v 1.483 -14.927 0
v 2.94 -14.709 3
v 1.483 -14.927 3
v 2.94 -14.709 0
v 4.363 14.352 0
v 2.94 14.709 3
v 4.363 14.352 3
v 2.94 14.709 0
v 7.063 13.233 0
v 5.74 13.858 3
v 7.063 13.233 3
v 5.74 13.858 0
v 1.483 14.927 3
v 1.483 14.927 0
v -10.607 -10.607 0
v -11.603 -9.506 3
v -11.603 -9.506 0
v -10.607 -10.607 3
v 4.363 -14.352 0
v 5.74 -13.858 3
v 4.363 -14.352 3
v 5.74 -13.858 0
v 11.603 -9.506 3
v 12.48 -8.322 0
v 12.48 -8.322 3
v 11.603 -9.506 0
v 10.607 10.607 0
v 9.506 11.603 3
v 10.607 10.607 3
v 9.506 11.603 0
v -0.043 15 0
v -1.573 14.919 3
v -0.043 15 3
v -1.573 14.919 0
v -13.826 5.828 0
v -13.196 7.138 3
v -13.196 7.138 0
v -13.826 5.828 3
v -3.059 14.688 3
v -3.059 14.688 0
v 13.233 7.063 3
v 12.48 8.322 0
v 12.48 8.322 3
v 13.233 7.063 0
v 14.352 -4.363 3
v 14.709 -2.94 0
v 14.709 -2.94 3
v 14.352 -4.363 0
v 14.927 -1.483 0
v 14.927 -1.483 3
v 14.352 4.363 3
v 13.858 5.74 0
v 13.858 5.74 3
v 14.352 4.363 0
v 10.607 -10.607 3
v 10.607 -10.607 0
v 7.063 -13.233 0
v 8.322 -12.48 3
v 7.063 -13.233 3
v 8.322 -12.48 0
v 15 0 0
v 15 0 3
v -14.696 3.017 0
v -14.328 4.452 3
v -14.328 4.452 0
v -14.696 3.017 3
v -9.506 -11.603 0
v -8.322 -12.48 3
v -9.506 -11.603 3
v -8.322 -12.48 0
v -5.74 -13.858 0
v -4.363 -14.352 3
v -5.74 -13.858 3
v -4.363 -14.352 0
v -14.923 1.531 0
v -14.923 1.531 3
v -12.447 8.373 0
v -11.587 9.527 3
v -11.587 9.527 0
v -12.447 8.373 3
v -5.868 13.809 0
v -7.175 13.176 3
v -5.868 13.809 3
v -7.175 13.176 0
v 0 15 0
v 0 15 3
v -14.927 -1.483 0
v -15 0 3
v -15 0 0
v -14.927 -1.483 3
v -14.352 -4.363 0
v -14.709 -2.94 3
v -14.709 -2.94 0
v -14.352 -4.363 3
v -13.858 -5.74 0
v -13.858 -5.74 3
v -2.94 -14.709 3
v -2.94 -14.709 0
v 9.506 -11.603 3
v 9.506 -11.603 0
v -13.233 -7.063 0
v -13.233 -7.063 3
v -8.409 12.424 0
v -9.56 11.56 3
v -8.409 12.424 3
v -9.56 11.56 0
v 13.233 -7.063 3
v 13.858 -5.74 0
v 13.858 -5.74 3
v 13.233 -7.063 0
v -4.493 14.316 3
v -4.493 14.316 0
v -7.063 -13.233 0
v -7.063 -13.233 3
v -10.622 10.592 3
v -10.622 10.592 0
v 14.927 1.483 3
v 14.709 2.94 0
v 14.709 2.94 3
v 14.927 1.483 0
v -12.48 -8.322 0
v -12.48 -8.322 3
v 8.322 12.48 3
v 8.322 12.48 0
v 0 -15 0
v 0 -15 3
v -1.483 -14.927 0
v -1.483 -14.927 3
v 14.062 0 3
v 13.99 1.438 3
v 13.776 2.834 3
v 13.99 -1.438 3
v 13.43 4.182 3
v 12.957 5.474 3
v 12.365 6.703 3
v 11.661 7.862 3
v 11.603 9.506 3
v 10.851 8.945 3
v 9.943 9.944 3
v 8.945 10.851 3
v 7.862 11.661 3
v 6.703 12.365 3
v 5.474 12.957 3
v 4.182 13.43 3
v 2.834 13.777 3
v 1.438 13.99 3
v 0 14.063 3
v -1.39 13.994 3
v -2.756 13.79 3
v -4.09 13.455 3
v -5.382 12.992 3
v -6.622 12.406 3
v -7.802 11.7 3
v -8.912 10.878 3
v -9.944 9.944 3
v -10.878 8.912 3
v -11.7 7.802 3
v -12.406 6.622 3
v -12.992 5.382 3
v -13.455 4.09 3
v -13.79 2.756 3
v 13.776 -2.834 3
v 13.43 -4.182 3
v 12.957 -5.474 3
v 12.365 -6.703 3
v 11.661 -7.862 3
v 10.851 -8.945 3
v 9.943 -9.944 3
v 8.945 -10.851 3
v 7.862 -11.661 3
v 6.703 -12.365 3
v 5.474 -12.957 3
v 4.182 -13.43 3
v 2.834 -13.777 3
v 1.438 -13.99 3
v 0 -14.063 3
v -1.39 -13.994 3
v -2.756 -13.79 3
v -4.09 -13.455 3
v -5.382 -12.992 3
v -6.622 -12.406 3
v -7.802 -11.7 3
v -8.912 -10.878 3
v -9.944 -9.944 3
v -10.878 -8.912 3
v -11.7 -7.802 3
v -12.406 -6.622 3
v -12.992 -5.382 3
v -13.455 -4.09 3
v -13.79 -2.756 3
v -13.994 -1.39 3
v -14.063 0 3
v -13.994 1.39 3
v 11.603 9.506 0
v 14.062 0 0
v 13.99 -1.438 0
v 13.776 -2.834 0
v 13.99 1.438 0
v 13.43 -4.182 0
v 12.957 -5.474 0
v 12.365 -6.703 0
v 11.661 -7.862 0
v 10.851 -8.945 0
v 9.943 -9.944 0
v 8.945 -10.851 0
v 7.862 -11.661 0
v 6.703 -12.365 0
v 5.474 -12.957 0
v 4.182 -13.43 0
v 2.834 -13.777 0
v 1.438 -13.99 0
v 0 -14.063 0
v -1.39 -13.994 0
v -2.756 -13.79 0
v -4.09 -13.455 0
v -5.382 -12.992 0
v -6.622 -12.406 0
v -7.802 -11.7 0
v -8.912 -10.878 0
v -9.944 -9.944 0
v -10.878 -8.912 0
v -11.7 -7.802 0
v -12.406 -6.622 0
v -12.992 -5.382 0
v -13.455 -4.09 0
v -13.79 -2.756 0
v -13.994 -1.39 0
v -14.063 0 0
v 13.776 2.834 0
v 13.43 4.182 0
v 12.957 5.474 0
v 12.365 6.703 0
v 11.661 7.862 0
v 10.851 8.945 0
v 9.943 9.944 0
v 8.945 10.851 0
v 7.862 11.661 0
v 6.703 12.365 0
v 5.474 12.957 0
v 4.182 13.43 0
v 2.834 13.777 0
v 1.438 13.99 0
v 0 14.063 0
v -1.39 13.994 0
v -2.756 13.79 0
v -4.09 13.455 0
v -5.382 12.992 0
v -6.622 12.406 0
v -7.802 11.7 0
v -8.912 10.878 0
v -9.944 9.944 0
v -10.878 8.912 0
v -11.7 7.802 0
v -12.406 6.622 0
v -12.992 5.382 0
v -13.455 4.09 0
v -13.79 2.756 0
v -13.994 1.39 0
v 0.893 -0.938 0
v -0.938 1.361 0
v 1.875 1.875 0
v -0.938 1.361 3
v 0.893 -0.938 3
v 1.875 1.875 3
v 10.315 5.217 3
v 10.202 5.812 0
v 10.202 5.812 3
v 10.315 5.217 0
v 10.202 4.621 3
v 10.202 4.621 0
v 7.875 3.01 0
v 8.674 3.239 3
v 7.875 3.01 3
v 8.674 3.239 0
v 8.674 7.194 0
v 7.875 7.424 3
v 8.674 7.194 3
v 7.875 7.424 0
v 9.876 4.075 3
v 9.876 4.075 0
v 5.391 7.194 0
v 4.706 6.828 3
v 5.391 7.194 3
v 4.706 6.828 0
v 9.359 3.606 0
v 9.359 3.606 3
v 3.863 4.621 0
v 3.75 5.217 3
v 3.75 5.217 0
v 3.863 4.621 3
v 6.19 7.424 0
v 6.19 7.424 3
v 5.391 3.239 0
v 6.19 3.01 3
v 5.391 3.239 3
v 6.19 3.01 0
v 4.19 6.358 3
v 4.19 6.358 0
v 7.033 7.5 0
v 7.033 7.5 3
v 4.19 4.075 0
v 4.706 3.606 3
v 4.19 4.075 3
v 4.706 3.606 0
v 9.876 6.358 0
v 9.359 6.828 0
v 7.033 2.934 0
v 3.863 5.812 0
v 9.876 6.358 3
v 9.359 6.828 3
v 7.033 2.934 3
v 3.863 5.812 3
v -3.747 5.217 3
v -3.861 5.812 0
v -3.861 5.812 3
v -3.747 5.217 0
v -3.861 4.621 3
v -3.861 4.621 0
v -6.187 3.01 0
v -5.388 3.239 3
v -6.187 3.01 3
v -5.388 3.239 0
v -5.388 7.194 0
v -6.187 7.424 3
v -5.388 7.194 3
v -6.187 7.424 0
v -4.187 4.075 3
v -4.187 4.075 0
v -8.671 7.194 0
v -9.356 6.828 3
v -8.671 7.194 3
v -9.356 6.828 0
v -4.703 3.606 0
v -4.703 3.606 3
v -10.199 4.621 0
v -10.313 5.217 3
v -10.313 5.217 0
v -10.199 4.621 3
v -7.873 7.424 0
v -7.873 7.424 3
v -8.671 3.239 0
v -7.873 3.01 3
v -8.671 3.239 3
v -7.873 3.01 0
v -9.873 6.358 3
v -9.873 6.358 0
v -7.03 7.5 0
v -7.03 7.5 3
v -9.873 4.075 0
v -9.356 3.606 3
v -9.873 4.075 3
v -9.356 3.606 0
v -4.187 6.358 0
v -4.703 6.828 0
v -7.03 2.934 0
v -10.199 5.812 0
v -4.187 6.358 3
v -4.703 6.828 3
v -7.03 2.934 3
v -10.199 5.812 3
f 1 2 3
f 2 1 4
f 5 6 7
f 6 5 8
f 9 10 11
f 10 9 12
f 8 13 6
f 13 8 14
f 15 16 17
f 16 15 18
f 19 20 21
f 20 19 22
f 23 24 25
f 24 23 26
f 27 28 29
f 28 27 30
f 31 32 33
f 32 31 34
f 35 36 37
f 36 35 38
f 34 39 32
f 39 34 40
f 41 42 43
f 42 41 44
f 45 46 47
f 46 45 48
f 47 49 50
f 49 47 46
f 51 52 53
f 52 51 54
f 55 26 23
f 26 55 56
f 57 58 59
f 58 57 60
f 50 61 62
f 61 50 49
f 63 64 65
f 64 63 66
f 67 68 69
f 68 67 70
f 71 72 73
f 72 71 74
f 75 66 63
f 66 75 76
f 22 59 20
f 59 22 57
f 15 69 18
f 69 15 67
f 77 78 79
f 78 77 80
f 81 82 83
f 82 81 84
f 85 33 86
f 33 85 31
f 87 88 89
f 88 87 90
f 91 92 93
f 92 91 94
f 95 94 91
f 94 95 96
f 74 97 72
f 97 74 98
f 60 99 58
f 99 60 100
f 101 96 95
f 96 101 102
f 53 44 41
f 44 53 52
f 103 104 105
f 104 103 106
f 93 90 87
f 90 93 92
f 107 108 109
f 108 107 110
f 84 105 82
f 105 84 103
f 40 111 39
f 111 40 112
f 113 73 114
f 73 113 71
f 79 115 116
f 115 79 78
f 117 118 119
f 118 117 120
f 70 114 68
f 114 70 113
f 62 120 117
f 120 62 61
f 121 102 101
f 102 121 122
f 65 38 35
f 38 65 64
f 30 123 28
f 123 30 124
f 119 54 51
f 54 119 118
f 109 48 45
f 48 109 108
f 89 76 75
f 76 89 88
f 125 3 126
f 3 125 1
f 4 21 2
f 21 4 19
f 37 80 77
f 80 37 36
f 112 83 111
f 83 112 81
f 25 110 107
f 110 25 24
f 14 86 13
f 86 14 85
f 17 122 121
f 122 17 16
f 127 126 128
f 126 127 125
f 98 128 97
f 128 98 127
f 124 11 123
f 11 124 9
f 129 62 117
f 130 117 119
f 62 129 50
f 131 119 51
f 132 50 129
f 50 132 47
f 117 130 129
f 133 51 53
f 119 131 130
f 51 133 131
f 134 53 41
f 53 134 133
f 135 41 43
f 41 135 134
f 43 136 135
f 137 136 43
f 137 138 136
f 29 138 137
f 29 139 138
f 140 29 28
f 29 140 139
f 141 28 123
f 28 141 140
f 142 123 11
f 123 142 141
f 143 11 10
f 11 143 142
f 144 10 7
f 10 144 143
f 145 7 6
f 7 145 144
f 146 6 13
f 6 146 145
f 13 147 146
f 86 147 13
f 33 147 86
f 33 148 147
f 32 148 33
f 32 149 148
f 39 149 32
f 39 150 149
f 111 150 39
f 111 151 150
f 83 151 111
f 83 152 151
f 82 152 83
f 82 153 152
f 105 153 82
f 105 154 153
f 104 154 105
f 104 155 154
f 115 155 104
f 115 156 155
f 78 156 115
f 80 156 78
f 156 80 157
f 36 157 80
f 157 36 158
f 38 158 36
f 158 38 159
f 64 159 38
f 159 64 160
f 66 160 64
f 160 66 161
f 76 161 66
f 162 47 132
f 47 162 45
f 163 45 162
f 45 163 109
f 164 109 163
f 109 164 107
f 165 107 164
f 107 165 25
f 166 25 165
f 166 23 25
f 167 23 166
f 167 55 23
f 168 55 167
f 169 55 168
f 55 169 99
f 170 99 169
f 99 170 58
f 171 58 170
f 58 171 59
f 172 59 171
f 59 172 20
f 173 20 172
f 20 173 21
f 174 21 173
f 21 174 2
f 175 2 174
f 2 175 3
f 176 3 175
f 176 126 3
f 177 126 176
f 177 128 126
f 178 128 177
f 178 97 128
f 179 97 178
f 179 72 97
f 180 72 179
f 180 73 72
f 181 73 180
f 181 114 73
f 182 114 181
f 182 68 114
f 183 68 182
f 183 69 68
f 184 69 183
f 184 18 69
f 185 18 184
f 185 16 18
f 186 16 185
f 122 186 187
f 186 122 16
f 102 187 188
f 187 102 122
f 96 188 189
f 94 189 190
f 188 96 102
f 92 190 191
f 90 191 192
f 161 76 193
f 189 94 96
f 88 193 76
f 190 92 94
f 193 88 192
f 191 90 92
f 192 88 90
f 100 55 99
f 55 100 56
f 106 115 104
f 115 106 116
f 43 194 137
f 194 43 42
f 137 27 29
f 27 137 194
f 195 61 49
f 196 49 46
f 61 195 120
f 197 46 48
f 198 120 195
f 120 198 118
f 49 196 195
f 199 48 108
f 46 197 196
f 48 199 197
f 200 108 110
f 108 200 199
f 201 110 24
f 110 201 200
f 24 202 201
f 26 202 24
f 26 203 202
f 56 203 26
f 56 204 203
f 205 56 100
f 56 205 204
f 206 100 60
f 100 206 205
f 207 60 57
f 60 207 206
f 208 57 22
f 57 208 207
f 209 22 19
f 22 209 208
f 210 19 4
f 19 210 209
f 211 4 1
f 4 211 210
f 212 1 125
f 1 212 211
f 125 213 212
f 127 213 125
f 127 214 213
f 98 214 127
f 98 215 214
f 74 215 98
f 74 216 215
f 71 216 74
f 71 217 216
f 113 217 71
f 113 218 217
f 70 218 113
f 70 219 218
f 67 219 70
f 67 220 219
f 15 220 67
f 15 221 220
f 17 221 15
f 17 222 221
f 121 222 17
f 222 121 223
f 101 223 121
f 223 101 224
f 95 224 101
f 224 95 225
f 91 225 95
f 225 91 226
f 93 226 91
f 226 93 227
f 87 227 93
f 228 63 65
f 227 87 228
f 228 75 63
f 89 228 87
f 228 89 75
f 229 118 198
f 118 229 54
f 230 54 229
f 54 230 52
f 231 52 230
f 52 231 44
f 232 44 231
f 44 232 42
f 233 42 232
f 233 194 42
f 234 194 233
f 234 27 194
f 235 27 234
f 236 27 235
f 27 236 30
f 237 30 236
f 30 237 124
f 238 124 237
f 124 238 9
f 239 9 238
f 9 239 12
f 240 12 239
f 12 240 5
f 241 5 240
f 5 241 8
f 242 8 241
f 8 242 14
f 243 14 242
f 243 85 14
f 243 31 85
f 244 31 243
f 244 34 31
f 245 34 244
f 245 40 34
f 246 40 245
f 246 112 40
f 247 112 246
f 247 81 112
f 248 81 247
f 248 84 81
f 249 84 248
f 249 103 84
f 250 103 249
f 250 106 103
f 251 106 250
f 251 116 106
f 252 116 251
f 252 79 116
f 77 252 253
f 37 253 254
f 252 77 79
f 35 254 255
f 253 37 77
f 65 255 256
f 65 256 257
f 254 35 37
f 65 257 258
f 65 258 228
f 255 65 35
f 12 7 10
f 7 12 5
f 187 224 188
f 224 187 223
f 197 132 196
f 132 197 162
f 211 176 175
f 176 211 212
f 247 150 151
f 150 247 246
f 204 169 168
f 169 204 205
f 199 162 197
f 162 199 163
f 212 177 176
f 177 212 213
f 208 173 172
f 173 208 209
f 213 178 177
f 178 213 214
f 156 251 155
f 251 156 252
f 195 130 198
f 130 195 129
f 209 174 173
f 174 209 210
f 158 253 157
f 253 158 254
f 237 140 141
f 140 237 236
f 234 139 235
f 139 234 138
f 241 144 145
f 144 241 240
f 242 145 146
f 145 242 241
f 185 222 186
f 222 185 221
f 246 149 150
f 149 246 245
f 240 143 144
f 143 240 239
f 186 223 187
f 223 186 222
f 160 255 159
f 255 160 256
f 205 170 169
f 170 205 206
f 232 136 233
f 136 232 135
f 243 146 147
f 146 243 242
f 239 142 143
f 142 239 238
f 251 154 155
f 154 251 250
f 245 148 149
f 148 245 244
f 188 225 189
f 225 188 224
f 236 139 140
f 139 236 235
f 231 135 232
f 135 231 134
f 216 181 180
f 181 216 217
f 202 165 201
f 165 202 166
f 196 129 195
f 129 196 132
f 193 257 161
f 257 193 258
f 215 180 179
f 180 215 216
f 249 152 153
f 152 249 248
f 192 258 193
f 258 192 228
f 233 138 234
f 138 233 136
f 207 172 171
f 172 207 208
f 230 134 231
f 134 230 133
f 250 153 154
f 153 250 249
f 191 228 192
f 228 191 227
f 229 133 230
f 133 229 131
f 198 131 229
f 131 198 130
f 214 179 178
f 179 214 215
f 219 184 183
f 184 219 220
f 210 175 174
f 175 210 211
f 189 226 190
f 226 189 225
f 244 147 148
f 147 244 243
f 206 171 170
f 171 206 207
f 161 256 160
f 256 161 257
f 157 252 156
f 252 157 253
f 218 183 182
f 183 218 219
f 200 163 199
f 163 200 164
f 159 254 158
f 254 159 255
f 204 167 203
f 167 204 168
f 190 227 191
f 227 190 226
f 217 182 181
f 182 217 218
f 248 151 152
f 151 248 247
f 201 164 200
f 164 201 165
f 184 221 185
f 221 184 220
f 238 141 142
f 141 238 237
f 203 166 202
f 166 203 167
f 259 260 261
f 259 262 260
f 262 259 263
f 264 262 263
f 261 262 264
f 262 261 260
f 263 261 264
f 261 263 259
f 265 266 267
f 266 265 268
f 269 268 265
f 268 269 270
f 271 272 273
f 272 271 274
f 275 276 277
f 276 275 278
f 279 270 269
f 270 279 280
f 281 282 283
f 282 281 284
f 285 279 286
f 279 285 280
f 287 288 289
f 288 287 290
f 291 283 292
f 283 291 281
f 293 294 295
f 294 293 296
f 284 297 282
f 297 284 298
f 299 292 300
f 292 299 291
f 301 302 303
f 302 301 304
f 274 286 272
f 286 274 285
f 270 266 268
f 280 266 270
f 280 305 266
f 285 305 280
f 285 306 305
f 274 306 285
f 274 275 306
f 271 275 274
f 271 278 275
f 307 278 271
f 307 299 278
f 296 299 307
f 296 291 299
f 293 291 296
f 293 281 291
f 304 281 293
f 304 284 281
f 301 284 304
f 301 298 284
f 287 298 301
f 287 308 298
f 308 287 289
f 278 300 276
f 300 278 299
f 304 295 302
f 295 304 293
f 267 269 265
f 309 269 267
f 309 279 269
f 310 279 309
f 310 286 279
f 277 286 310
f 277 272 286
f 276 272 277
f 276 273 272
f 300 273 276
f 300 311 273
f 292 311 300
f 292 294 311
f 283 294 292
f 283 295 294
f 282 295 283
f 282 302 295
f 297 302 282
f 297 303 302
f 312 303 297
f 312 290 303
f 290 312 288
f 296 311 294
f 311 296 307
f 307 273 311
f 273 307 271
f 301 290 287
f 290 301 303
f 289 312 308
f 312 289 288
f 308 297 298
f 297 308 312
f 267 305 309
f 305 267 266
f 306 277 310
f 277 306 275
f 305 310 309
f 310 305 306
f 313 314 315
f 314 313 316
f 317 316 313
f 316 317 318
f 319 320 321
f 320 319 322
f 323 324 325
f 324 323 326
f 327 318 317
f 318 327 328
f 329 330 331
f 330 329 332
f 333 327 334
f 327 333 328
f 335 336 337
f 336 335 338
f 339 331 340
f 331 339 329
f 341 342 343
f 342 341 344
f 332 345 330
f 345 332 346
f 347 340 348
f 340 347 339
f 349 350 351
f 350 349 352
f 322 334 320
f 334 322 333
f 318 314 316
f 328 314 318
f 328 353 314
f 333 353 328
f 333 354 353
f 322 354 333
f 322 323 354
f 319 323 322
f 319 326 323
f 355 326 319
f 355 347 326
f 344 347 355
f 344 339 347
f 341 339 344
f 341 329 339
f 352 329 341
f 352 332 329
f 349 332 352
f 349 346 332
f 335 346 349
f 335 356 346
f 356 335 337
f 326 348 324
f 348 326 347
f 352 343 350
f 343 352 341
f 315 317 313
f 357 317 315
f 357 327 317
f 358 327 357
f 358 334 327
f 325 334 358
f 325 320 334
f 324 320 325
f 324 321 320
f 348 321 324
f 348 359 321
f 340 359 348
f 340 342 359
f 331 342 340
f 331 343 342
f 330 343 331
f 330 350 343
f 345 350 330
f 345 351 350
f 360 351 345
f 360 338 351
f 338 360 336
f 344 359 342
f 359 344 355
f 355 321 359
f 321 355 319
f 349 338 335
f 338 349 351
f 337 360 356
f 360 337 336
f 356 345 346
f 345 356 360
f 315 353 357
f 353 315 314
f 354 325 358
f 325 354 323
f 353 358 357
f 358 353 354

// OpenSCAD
// Module names are of the form poly_<inkscape-path-id>().  As a result,
// you can associate a polygon in this OpenSCAD program with the corresponding
// SVG element in the Inkscape document by looking for the XML element with
// the attribute id="inkscape-path-id".

// fudge value is used to ensure that subtracted solids are a tad taller
// in the z dimension than the polygon being subtracted from.  This helps
// keep the resulting .stl file manifold.
fudge = 0.1;

module poly_path890(h)
{
  scale([25.4/96, -25.4/96, 1]) union()
  {
    linear_extrude(height=h)
      polygon([[3.375257,3.543491],[-3.543926,-5.142996],[7.085988,-7.086432]]);
  }
}

module poly_path8433(h)
{
  scale([25.4/96, -25.4/96, 1]) union()
  {
    linear_extrude(height=h)
      polygon([[14.172670,-19.716904],[14.602158,-17.465311],[15.834948,-15.402146],[17.787526,-13.628016],[20.376377,-12.243525],[23.394717,-11.376423],[26.580084,-11.087389],[29.765451,-11.376423],[32.783791,-12.243525],[35.372642,-13.628016],[37.325219,-15.402146],[38.558009,-17.465311],[38.987498,-19.716904],[38.558009,-21.968497],[37.325219,-24.031662],[35.372642,-25.805792],[32.783791,-27.190283],[29.765451,-28.057385],[26.580084,-28.346419],[23.394717,-28.057385],[20.376377,-27.190283],[17.787526,-25.805792],[15.834948,-24.031662],[14.602158,-21.968497]]);
  }
}

module poly_path841(h)
{
  scale([25.4/96, -25.4/96, 1]) union()
  {
    difference()
    {
       linear_extrude(height=h)
         polygon([[-0.161134,-56.693112],[-5.945503,-56.385104],[-11.561801,-55.513267],[-16.981725,-54.105983],[-22.176973,-52.191636],[-27.119242,-49.798609],[-31.780231,-46.955285],[-36.131635,-43.690047],[-40.145154,-40.031278],[-43.792484,-36.007362],[-47.045323,-31.646681],[-49.875369,-26.977619],[-52.254319,-22.028558],[-54.153871,-16.827882],[-55.545722,-11.403974],[-56.401570,-5.785218],[-56.693112,0.000005],[-56.415712,5.603429],[-55.593737,11.111945],[-54.242586,16.488377],[-52.377658,21.695550],[-50.014351,26.696288],[-47.168063,31.453417],[-43.854193,35.929761],[-40.088140,40.088145],[-35.929756,43.854198],[-31.453412,47.168067],[-26.696282,50.014354],[-21.695543,52.377660],[-16.488370,54.242588],[-11.111938,55.593738],[-5.603422,56.415712],[0.000002,56.693112],[5.603426,56.415712],[11.111941,55.593737],[16.488373,54.242587],[21.695546,52.377659],[26.696284,50.014353],[31.453414,47.168065],[35.929758,43.854196],[40.088141,40.088144],[43.854194,35.929760],[47.168064,31.453416],[50.014351,26.696287],[52.377658,21.695549],[54.242586,16.488376],[55.593737,11.111944],[56.415712,5.603429],[56.693112,0.000005],[56.415713,-5.603420],[55.593739,-11.111936],[54.242589,-16.488368],[52.377661,-21.695542],[50.014354,-26.696281],[47.168067,-31.453411],[43.854198,-35.929756],[40.088145,-40.088140],[35.929761,-43.854194],[31.453417,-47.168063],[26.696287,-50.014351],[21.695548,-52.377658],[16.488375,-54.242586],[11.111942,-55.593737],[5.603426,-56.415712],[0.000002,-56.693112],[-0.161148,-56.693112],[-0.161134,-56.693112]]);
       translate([0, 0, -fudge])
         linear_extrude(height=h+2*fudge)
           polygon([[0.000016,-53.150021],[5.434176,-52.875476],[10.711350,-52.069949],[15.804824,-50.760154],[20.687883,-48.972807],[25.333814,-46.734623],[29.715900,-44.072319],[33.807429,-41.012608],[37.581686,-37.582207],[41.011955,-33.807831],[44.071523,-29.716196],[46.733675,-25.334016],[48.971696,-20.688008],[50.758873,-15.804886],[52.068490,-10.711367],[52.873834,-5.434164],[53.148189,0.000005],[52.873834,5.434175],[52.068490,10.711378],[50.758872,15.804898],[48.971694,20.688020],[46.733672,25.334029],[44.071519,29.716209],[41.011950,33.807844],[37.581679,37.582220],[33.807422,41.012621],[29.715892,44.072331],[25.333804,46.734635],[20.687873,48.972818],[15.804813,50.760164],[10.711338,52.069958],[5.434162,52.875485],[0.000002,53.150028],[-5.253239,52.889985],[-10.417504,52.119398],[-15.457941,50.852703],[-20.339696,49.104335],[-25.027919,46.888732],[-29.487756,44.220329],[-33.684355,41.113563],[-37.582862,37.582869],[-41.113556,33.684361],[-44.220322,29.487763],[-46.888725,25.027926],[-49.104329,20.339703],[-50.852696,15.457947],[-52.119391,10.417511],[-52.889979,5.253246],[-53.150021,0.000005],[-52.889979,-5.253236],[-52.119392,-10.417501],[-50.852697,-15.457938],[-49.104329,-20.339694],[-46.888726,-25.027917],[-44.220323,-29.487754],[-41.113557,-33.684353],[-37.582863,-37.582861],[-33.684355,-41.113555],[-29.487757,-44.220321],[-25.027920,-46.888724],[-20.339697,-49.104328],[-15.457941,-50.852696],[-10.417504,-52.119391],[-5.253239,-52.889978],[0.000002,-53.150021],[0.000016,-53.150021]]);
    }
  }
}

module poly_path862(h)
{
  scale([25.4/96, -25.4/96, 1]) union()
  {
    linear_extrude(height=h)
      polygon([[37.450074,11.624564],[37.605980,12.286457],[37.423808,13.006043],[36.883277,13.713445],[34.767665,15.072604],[31.340198,16.325737],[26.681929,17.434644],[21.000480,18.343884],[14.579915,19.012930],[0.304290,19.567149],[-12.445628,19.129477],[-23.381849,17.910866],[-27.894627,17.052859],[-31.623748,16.052600],[-34.459131,14.927748],[-36.290701,13.695964],[-35.970310,15.242349],[-35.302383,16.740672],[-32.994351,19.564595],[-29.507471,22.110655],[-24.982608,24.321778],[-19.560629,26.140888],[-13.382399,27.510909],[-6.588784,28.374766],[0.679349,28.675383],[8.135080,28.359113],[15.079395,27.452085],[21.363535,26.016890],[26.838744,24.116120],[31.356264,21.812365],[34.767337,19.168217],[36.011469,17.738054],[36.923205,16.246266],[37.483950,14.700674],[37.675110,13.109103],[37.505386,11.624564],[37.450074,11.624564]]);
  }
}

module poly_path843(h)
{
  scale([25.4/96, -25.4/96, 1]) union()
  {
    linear_extrude(height=h)
      polygon([[-38.976935,-19.716904],[-38.547447,-17.465311],[-37.314657,-15.402146],[-35.362080,-13.628015],[-32.773228,-12.243524],[-29.754888,-11.376423],[-26.569521,-11.087389],[-23.384154,-11.376423],[-20.365814,-12.243524],[-17.776963,-13.628015],[-15.824385,-15.402146],[-14.591596,-17.465311],[-14.162107,-19.716904],[-14.591596,-21.968497],[-15.824385,-24.031662],[-17.776963,-25.805793],[-20.365814,-27.190284],[-23.384154,-28.057385],[-26.569521,-28.346419],[-29.754888,-28.057385],[-32.773228,-27.190284],[-35.362080,-25.805793],[-37.314657,-24.031662],[-38.547447,-21.968497]]);
  }
}

module Happy_Face(h)
{

poly_path890(h);
poly_path8433(h);
poly_path841(h);
poly_path862(h);
poly_path843(h);
}

Happy_Face(3);
